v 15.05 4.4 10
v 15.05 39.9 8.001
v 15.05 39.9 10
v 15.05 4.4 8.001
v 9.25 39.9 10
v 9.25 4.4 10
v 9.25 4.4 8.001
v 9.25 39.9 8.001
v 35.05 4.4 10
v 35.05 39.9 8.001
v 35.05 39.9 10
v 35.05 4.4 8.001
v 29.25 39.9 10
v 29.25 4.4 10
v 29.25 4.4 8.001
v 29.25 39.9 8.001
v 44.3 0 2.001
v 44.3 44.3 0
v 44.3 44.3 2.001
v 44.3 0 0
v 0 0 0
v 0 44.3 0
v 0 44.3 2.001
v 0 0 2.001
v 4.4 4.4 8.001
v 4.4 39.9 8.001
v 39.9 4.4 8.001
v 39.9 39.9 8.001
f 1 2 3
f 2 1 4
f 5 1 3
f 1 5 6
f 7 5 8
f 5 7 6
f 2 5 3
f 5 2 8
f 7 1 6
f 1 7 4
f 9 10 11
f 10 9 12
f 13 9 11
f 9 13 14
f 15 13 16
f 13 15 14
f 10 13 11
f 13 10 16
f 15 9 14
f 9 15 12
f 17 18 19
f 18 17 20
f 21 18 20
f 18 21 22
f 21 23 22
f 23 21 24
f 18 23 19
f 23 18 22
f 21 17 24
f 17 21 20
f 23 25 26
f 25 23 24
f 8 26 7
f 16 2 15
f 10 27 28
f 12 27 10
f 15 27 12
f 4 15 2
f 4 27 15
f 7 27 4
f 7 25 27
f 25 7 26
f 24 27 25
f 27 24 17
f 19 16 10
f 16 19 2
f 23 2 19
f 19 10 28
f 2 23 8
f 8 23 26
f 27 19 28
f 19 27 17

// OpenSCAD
base_neck_w = 35.5;
base_neck_h = 6.0;
base_h = 2.0;
base_w = 44.3;
accepter_wall_w = 4.0;
accepter_floor_thickness = 5.0;
bolt_head_h = 3.0;
hole_r = 3.0;
washer_r = 4.8;

full_thickness = accepter_floor_thickness+base_h+base_neck_h;

module base_plate() {
	offset = base_neck_w-base_w;
	cube([base_w, base_w, base_h]);
	translate([0,0,base_h]) {
		hull() {
			cube([base_w, base_w, 0.001]);
			translate([-offset/2, -offset/2, base_neck_h])
				cube([base_neck_w, base_neck_w, 0.001]);
		}
	}
}

module block() {
	w = base_w+accepter_wall_w*2;

	translate([-accepter_wall_w, -accepter_wall_w, -accepter_floor_thickness])
		cube([w, w, accepter_floor_thickness+base_h+base_neck_h]);
}

module b2() {
translate([0,1.65,-0.01])
scale([0.9,0.93,0.728])
minkowski() {
	block();
	rotate([45,45,0])
		cube([3,3,3]);
}
}


module accepter() {
	difference() {
		b2(); // replace with 'block();' for square
		translate([0, -base_w/4, 0])
			base_plate();
		translate([0, +base_w/4, 0])
			base_plate();

		translate([base_w/2-base_neck_w/2-1, -base_w/2, base_neck_h/2])
			cube([base_neck_w+2, base_w*2, 5]);
		
		translate([base_w/2, base_w/2, -accepter_floor_thickness]) {
			translate([0,0,-0.5])
			cylinder(r=hole_r, h=full_thickness+2, $fn=32);
			translate([0, 0, accepter_floor_thickness-bolt_head_h])
				cylinder(r=washer_r, h=bolt_head_h+0.001, $fn=32);
		}
	}
}

//accepter();

module hextube(base=5, mid=7, height=5, depth=10) {
	hull() {
		translate([0, -height/2, 0])
			cube([base, depth, 0.001]);
		translate([0, 0, 0])
			cube([mid, depth, 0.001]);
		translate([0, height/2, 0])
			cube([base, depth, 0.001]);
	}
}

alu_w = 40.5;
slot_w = 5.8;
slot_c = 10.0;

module tripodmount() {
	translate([base_w/2, (base_w-base_neck_w)/2, base_h+base_neck_h]) {
		translate([-slot_c-slot_w/2, 0, 0])
			cube([slot_w, base_neck_w, 2]);

		translate([slot_c-slot_w/2, 0, 0])
			cube([slot_w, base_neck_w, 2]);
	}
	base_plate();
}

tripodmount();
